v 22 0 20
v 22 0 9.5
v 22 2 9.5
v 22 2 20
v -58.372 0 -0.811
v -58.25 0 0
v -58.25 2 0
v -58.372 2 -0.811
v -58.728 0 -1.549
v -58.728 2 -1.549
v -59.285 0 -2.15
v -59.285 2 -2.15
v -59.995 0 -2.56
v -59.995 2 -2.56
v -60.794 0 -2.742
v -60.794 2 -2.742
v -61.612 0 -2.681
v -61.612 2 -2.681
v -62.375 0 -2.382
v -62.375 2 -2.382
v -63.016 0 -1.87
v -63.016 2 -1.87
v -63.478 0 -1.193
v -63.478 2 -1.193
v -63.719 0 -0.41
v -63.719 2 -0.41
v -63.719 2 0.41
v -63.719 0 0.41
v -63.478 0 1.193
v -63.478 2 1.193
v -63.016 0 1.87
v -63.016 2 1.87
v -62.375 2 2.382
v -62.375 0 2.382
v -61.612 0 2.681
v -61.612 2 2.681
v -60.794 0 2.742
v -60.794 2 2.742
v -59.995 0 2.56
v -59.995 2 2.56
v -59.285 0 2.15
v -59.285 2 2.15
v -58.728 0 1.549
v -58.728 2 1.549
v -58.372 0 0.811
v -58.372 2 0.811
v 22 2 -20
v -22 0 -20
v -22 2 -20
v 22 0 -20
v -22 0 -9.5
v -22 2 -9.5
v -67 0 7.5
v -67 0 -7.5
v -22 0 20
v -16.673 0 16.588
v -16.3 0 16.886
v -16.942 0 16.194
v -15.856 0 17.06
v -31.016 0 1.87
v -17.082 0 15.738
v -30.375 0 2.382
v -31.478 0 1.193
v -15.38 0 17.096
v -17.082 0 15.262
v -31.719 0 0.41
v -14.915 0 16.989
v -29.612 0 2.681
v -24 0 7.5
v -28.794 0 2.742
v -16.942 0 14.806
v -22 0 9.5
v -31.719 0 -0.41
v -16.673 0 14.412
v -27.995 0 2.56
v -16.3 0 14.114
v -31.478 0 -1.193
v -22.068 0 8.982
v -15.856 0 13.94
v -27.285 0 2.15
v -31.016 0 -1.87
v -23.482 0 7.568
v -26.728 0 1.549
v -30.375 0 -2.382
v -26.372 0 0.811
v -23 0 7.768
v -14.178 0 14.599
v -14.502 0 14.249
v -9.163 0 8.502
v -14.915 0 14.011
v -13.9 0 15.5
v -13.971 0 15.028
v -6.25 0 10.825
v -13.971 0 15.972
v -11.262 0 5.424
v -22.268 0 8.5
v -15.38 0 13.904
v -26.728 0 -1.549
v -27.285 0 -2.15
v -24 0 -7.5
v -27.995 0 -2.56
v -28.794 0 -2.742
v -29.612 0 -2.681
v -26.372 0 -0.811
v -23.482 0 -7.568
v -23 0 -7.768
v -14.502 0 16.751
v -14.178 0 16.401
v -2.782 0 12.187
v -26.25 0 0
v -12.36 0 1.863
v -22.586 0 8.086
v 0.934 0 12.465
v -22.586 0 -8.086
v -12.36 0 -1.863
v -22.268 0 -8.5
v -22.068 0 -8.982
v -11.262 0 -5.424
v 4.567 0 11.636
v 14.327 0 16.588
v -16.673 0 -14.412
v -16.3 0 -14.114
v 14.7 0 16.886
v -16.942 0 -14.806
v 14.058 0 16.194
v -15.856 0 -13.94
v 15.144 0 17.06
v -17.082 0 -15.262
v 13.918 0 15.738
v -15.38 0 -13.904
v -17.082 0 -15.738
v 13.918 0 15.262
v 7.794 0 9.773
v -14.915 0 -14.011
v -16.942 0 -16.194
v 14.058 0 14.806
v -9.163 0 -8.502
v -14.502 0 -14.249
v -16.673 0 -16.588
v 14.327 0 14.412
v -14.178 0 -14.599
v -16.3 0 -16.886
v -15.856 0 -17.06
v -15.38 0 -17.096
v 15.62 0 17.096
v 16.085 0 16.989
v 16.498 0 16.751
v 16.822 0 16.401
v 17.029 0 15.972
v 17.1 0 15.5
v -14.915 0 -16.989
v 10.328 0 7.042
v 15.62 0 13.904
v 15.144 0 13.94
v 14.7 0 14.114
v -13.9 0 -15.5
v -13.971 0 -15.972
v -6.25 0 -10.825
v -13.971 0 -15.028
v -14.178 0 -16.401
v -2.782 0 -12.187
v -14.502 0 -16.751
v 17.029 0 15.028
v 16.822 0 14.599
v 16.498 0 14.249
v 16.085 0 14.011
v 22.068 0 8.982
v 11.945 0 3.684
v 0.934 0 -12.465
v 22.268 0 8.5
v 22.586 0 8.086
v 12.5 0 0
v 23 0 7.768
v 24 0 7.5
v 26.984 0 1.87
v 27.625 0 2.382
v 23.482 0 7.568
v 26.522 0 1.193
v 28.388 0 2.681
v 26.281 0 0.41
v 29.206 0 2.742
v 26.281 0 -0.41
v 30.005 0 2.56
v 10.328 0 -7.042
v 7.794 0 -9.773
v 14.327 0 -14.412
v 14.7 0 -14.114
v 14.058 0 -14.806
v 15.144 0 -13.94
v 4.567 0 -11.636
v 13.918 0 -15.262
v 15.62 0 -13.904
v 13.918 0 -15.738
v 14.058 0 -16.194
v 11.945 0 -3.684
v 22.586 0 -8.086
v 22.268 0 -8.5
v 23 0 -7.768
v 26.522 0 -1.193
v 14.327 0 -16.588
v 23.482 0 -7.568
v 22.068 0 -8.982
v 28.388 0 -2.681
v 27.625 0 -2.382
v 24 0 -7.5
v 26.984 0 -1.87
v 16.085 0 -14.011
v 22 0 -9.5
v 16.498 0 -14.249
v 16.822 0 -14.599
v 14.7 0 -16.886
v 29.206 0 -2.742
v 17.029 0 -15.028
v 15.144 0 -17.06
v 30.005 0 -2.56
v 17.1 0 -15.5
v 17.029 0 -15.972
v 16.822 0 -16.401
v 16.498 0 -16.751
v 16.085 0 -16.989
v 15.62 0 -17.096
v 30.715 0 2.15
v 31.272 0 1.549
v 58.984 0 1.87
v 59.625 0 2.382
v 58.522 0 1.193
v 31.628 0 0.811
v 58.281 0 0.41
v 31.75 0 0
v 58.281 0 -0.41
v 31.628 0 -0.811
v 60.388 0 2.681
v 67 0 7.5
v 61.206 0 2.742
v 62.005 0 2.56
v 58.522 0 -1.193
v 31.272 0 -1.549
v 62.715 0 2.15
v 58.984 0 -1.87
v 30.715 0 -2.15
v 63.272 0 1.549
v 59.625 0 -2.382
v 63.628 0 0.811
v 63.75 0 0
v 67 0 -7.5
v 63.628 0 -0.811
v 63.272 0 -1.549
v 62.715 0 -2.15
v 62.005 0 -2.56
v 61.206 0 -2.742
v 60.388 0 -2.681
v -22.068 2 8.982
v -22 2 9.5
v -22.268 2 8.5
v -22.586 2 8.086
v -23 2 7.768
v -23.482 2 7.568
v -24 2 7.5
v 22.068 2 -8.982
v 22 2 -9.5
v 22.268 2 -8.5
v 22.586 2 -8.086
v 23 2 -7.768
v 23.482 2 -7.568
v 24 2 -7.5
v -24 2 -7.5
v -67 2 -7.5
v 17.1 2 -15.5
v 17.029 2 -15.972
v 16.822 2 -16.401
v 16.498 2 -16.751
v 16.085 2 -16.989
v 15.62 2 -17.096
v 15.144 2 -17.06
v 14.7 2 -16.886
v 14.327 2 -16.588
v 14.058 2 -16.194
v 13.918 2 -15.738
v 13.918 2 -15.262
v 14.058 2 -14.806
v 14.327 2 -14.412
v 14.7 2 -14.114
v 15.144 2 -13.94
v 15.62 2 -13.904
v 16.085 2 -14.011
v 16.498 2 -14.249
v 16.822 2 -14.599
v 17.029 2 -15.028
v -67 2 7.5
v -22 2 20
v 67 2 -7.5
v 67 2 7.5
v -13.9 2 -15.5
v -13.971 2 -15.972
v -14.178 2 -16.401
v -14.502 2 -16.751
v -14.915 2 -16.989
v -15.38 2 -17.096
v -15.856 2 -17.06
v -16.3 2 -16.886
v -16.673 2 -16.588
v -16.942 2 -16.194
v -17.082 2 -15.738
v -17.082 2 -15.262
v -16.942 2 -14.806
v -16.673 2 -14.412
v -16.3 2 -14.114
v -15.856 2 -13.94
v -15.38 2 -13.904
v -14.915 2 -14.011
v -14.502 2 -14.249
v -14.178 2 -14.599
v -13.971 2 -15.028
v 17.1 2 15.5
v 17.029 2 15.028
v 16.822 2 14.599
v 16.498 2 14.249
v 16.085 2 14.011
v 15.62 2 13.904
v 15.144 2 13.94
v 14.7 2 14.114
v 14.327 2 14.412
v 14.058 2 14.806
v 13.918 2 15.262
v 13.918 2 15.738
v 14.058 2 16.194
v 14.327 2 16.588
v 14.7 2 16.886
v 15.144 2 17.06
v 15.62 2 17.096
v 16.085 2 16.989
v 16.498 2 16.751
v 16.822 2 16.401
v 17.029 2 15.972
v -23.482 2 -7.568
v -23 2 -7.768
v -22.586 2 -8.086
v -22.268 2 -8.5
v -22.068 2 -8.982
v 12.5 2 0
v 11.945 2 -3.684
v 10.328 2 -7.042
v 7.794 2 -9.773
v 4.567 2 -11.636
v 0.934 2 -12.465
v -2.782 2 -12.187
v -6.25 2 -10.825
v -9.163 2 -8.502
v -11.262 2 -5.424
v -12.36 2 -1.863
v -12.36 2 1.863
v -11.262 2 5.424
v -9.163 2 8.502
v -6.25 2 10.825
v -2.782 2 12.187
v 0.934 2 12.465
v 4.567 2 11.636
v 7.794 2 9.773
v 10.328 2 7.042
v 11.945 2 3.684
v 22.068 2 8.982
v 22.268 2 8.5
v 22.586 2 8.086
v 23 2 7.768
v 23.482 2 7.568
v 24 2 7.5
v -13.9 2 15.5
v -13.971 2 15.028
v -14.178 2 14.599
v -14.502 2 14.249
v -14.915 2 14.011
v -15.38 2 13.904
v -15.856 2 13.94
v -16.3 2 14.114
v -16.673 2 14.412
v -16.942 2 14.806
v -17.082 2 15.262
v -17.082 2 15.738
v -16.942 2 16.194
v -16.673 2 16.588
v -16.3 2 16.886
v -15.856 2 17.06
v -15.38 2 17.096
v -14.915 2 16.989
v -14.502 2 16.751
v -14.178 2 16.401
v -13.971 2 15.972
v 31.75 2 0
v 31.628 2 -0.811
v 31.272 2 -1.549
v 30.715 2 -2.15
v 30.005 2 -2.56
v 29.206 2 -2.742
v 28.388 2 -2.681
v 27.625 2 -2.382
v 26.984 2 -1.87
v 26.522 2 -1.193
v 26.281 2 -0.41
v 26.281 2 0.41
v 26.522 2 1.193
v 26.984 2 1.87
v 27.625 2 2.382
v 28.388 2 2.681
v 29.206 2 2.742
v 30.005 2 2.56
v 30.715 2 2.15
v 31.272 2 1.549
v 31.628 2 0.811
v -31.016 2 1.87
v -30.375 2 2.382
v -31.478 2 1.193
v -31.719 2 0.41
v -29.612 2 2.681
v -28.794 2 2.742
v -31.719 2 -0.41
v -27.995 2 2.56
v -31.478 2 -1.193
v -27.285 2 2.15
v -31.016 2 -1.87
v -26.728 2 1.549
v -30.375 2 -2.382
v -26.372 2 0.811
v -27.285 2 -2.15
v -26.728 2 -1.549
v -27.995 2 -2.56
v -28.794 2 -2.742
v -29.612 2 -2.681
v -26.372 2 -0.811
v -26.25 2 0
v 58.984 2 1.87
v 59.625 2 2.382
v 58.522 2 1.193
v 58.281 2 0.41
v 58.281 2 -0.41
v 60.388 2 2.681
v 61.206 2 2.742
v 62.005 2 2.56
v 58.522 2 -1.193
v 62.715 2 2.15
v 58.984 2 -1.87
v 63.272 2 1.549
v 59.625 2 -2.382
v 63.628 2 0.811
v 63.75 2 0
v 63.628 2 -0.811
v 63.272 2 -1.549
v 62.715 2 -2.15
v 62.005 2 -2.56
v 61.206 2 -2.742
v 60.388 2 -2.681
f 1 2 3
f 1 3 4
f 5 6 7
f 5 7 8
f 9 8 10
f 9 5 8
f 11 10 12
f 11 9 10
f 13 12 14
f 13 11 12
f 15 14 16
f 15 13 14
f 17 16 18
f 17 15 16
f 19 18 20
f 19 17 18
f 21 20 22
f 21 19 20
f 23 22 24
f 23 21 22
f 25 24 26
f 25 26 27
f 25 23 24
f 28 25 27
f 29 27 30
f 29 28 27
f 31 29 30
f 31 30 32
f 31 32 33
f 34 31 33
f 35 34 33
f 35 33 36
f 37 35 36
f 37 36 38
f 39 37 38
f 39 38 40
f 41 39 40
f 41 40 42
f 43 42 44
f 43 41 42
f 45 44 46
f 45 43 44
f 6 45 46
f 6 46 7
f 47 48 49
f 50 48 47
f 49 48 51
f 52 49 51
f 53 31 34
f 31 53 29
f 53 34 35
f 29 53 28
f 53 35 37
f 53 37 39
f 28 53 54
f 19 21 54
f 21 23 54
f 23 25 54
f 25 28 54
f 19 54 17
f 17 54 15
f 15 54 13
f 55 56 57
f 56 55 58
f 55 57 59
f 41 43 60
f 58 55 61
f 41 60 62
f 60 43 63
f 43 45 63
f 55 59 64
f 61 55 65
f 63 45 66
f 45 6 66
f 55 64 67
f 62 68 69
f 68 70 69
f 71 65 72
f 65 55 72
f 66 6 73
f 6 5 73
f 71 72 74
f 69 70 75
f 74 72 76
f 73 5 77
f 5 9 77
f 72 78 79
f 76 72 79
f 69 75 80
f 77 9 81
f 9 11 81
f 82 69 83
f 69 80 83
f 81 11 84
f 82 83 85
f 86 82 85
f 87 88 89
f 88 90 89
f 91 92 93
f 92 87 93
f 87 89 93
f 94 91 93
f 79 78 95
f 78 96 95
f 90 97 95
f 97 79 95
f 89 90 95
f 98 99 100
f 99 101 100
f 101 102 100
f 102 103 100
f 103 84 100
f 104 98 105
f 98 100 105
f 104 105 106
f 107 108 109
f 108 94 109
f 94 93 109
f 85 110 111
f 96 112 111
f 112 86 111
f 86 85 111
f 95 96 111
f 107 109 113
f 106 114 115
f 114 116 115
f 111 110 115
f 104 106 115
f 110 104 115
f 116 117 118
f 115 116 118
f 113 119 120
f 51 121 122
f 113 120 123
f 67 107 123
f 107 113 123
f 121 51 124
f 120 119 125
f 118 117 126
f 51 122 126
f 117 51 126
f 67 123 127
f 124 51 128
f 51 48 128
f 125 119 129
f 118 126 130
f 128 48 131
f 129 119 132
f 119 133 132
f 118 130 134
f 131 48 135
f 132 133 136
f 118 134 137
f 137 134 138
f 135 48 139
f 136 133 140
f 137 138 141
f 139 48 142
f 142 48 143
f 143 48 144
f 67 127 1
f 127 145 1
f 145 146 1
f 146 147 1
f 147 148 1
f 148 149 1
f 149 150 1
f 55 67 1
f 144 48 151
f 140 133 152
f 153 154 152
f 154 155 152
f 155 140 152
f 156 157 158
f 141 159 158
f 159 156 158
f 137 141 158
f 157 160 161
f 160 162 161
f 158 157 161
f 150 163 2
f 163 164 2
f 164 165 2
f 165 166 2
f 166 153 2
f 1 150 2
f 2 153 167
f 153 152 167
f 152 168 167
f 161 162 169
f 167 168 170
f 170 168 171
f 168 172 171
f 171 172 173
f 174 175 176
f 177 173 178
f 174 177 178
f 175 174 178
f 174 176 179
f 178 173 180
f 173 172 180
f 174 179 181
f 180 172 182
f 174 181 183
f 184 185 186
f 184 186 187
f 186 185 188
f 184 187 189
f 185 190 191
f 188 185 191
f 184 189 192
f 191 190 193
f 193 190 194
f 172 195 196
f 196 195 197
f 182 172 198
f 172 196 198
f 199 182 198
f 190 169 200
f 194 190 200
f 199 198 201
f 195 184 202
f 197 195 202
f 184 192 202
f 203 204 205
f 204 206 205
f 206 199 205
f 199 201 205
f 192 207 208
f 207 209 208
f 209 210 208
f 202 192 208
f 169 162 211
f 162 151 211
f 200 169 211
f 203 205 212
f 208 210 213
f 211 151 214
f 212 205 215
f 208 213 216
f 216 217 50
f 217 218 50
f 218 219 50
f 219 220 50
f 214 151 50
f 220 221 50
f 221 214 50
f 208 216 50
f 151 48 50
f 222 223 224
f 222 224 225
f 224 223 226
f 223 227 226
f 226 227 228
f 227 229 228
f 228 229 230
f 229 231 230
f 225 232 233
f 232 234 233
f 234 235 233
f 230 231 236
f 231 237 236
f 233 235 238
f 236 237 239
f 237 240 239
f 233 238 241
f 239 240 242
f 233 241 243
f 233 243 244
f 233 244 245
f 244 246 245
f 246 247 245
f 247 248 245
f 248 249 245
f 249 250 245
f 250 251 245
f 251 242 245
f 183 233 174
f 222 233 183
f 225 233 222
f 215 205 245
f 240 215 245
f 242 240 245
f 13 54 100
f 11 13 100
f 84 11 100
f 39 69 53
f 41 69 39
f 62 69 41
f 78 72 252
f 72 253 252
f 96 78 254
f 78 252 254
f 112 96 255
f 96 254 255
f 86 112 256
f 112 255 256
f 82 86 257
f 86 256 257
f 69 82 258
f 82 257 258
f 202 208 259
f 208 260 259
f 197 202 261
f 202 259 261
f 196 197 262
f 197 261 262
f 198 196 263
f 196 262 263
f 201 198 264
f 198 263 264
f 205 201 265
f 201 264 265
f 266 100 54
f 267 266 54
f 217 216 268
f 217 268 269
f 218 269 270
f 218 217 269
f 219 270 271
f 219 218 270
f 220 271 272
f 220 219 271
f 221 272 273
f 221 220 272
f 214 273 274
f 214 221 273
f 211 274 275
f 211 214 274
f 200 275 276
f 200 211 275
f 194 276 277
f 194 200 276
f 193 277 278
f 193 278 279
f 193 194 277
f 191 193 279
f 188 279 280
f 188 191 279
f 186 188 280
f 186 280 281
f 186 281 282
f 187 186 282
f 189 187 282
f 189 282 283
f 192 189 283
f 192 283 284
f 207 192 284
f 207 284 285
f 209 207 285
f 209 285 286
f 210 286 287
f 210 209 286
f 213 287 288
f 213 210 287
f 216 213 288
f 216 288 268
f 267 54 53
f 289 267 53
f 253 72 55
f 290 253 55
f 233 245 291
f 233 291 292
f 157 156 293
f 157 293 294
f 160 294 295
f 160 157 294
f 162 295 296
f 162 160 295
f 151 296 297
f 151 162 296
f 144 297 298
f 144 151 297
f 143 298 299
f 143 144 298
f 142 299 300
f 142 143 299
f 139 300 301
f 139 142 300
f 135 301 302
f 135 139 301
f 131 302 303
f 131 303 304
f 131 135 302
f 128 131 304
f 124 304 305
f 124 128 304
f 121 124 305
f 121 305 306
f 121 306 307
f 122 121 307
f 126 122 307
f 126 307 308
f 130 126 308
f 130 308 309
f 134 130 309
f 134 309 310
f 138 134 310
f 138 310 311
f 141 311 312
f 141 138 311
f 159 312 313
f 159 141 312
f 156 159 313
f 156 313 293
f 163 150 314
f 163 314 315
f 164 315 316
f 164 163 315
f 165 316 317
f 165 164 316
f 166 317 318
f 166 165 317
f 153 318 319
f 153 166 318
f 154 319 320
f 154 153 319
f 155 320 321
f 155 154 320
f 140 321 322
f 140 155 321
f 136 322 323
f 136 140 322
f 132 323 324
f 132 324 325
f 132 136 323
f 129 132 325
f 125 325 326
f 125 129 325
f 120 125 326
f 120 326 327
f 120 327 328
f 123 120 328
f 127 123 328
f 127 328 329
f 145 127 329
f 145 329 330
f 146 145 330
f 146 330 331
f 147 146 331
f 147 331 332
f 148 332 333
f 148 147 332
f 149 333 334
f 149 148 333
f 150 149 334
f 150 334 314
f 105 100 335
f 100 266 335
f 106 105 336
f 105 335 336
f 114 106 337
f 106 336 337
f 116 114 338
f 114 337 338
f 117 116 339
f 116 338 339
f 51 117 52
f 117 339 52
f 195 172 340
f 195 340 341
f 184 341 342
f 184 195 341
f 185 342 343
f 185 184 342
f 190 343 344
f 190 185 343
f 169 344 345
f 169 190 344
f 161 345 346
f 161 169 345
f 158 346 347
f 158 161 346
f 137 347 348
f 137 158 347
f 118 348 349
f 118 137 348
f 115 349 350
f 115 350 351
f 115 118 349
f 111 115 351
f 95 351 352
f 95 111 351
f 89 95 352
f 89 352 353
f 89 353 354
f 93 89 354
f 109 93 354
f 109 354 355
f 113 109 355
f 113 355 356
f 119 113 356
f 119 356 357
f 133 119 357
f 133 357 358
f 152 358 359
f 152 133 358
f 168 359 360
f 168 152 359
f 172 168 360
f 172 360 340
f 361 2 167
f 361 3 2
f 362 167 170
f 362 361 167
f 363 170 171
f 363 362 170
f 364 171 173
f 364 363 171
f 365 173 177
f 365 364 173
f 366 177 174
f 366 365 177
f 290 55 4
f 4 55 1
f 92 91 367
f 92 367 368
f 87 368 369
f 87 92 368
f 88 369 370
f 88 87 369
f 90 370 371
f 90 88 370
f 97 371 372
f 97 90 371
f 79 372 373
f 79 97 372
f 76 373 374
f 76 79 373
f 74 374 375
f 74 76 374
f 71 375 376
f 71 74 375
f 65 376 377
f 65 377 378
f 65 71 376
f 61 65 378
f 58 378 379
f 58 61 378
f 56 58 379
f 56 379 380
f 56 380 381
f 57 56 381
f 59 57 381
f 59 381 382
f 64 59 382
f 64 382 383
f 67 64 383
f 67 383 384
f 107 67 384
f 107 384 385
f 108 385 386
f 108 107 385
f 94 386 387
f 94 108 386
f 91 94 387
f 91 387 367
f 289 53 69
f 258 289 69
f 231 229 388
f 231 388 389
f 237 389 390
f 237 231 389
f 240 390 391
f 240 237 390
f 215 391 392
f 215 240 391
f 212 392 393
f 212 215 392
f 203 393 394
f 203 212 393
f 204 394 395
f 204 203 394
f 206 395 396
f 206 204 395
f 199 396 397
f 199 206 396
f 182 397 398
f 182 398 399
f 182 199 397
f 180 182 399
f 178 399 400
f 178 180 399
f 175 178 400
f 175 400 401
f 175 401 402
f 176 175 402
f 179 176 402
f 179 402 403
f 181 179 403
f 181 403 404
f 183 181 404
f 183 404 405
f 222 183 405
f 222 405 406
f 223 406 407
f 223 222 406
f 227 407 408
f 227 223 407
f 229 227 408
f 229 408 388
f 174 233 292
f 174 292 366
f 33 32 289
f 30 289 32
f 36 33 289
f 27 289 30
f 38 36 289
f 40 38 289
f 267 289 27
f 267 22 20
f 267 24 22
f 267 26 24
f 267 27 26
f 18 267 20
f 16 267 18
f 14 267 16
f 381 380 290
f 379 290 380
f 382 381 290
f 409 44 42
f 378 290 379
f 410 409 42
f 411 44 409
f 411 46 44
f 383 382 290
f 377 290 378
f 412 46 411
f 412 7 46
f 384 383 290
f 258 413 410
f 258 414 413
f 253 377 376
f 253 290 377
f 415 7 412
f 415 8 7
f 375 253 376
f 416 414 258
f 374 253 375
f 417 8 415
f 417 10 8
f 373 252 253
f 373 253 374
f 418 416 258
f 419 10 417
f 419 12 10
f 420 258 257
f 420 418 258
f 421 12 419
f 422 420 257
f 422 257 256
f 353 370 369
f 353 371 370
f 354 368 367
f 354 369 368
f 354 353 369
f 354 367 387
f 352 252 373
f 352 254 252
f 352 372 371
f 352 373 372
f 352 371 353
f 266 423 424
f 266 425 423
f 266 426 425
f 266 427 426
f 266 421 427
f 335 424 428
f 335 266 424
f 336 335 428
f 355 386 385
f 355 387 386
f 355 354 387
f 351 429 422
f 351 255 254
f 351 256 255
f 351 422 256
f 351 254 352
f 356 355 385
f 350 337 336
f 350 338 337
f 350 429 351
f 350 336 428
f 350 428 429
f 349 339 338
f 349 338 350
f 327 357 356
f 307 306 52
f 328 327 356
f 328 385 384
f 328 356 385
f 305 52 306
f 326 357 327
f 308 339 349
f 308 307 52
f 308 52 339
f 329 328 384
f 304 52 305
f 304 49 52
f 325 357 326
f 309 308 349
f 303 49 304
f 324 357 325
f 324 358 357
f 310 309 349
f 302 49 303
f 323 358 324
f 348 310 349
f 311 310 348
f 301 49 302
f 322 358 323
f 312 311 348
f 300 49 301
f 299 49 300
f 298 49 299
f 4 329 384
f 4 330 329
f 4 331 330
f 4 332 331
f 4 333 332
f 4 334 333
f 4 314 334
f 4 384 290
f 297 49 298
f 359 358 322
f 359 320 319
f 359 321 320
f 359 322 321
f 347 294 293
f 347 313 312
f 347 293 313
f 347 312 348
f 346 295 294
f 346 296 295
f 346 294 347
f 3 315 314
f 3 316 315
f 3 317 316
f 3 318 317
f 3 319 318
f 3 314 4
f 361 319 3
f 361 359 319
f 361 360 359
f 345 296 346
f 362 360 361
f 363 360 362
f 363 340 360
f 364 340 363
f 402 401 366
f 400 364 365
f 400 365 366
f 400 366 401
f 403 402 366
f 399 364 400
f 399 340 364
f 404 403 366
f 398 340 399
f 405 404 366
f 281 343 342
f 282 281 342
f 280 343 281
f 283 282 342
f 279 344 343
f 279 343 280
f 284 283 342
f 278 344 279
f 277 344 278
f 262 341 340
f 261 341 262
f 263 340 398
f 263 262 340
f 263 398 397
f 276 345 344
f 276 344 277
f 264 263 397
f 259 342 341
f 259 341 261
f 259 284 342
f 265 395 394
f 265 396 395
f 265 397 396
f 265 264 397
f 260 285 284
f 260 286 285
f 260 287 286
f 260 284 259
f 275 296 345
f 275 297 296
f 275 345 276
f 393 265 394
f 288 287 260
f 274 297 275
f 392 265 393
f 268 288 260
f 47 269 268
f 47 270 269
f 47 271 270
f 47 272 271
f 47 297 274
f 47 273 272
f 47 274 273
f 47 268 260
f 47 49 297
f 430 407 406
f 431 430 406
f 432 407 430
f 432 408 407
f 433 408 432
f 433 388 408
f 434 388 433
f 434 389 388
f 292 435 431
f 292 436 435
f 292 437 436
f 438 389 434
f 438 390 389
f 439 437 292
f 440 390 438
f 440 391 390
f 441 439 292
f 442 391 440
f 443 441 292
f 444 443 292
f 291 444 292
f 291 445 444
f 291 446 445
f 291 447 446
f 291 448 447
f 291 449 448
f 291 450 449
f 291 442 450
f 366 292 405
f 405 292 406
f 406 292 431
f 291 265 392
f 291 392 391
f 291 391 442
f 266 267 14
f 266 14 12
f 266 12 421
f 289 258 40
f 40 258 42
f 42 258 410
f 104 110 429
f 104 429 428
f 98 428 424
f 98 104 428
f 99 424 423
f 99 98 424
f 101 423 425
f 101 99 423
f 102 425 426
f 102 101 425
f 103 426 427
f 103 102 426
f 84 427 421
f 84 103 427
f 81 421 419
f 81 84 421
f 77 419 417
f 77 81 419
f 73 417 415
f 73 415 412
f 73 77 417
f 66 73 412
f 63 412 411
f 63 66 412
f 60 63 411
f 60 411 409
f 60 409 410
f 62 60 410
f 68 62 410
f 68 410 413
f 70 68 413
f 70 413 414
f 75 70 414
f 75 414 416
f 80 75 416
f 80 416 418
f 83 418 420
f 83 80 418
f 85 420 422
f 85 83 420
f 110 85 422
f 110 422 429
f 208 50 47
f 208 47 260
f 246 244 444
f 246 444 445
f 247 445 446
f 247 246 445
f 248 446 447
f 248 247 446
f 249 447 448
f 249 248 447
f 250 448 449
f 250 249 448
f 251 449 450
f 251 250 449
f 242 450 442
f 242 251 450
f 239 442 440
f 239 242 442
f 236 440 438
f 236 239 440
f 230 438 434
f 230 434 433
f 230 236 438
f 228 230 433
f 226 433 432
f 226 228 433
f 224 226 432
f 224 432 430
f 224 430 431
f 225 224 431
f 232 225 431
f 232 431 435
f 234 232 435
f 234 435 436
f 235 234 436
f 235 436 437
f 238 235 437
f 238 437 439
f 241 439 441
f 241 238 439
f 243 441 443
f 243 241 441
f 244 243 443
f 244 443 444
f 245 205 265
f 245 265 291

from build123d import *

# Parameters (mm, degrees)
ESQUISSE1_W             = 140
ESQUISSE1_H             = 40
ESQUISSE1_R             = 2.75
ESQUISSE1_R_2           = 1.6
ESQUISSE1_R_3           = 12.5
BOSS_EXTRU_1_DEPTH      = 2
ENL_V_MAT_EXTRU_1_REACH = 4
CONG_1_R                = 2


with BuildPart() as part:
    # Esquisse1 → Boss.-Extru.1 (new body)
    with BuildSketch(Plane(origin=(0, 0, 0), x_dir=(1, 0, 0), z_dir=(0, 1, 0))):
        Rectangle(ESQUISSE1_W, ESQUISSE1_H)
        with Locations((-61, 0)):
            Circle(ESQUISSE1_R, mode=Mode.SUBTRACT)
        with Locations((-29, 0)):
            Circle(ESQUISSE1_R, mode=Mode.SUBTRACT)
        with Locations((29, 0)):
            Circle(ESQUISSE1_R, mode=Mode.SUBTRACT)
        with Locations((61, 0)):
            Circle(ESQUISSE1_R, mode=Mode.SUBTRACT)
        with Locations((-15.5, 15.5)):
            Circle(ESQUISSE1_R_2, mode=Mode.SUBTRACT)
        with Locations((15.5, 15.5)):
            Circle(ESQUISSE1_R_2, mode=Mode.SUBTRACT)
        with Locations((15.5, -15.5)):
            Circle(ESQUISSE1_R_2, mode=Mode.SUBTRACT)
        with Locations((-15.5, -15.5)):
            Circle(ESQUISSE1_R_2, mode=Mode.SUBTRACT)
        Circle(ESQUISSE1_R_3, mode=Mode.SUBTRACT)
    extrude(amount=BOSS_EXTRU_1_DEPTH)

    # Esquisse2 → Enlèv. mat.-Extru.1 (cut, up to next)
    with BuildSketch(Plane.XZ, mode=Mode.PRIVATE) as enl_v_mat_extru_1_sk1:
        Polygon((22, -20), (22, -7.5), (67, -7.5), (67, 7.5), (22, 7.5), (22, 20), (70, 20), (70, -20), align=None)
    enl_v_mat_extru_1_tool1 = extrude(enl_v_mat_extru_1_sk1.sketch, amount=-ENL_V_MAT_EXTRU_1_REACH, mode=Mode.PRIVATE) & part.part
    add(enl_v_mat_extru_1_tool1.solids().sort_by_distance((22.62482, 0, -13.75))[0], mode=Mode.SUBTRACT)
    # Esquisse2 → Enlèv. mat.-Extru.1 (cut, up to next)
    with BuildSketch(Plane.XZ, mode=Mode.PRIVATE) as enl_v_mat_extru_1_sk2:
        Polygon((-70, 20), (-70, -20), (-22, -20), (-22, -7.5), (-67, -7.5), (-67, 7.5), (-22, 7.5), (-22, 20), align=None)
    enl_v_mat_extru_1_tool2 = extrude(enl_v_mat_extru_1_sk2.sketch, amount=-ENL_V_MAT_EXTRU_1_REACH, mode=Mode.PRIVATE) & part.part
    add(enl_v_mat_extru_1_tool2.solids().sort_by_distance((-69.37518, 0, 0))[0], mode=Mode.SUBTRACT)

    # Congé1
    cong_1_edges = [part.edges().sort_by_distance(p)[0] for p in [
        (22, 1, -7.5),
        (22, 1, 7.5),
        (-22, 1, 7.5),
        (-22, 1, -7.5),
    ]]
    fillet(cong_1_edges, radius=CONG_1_R)


solid = part.part
